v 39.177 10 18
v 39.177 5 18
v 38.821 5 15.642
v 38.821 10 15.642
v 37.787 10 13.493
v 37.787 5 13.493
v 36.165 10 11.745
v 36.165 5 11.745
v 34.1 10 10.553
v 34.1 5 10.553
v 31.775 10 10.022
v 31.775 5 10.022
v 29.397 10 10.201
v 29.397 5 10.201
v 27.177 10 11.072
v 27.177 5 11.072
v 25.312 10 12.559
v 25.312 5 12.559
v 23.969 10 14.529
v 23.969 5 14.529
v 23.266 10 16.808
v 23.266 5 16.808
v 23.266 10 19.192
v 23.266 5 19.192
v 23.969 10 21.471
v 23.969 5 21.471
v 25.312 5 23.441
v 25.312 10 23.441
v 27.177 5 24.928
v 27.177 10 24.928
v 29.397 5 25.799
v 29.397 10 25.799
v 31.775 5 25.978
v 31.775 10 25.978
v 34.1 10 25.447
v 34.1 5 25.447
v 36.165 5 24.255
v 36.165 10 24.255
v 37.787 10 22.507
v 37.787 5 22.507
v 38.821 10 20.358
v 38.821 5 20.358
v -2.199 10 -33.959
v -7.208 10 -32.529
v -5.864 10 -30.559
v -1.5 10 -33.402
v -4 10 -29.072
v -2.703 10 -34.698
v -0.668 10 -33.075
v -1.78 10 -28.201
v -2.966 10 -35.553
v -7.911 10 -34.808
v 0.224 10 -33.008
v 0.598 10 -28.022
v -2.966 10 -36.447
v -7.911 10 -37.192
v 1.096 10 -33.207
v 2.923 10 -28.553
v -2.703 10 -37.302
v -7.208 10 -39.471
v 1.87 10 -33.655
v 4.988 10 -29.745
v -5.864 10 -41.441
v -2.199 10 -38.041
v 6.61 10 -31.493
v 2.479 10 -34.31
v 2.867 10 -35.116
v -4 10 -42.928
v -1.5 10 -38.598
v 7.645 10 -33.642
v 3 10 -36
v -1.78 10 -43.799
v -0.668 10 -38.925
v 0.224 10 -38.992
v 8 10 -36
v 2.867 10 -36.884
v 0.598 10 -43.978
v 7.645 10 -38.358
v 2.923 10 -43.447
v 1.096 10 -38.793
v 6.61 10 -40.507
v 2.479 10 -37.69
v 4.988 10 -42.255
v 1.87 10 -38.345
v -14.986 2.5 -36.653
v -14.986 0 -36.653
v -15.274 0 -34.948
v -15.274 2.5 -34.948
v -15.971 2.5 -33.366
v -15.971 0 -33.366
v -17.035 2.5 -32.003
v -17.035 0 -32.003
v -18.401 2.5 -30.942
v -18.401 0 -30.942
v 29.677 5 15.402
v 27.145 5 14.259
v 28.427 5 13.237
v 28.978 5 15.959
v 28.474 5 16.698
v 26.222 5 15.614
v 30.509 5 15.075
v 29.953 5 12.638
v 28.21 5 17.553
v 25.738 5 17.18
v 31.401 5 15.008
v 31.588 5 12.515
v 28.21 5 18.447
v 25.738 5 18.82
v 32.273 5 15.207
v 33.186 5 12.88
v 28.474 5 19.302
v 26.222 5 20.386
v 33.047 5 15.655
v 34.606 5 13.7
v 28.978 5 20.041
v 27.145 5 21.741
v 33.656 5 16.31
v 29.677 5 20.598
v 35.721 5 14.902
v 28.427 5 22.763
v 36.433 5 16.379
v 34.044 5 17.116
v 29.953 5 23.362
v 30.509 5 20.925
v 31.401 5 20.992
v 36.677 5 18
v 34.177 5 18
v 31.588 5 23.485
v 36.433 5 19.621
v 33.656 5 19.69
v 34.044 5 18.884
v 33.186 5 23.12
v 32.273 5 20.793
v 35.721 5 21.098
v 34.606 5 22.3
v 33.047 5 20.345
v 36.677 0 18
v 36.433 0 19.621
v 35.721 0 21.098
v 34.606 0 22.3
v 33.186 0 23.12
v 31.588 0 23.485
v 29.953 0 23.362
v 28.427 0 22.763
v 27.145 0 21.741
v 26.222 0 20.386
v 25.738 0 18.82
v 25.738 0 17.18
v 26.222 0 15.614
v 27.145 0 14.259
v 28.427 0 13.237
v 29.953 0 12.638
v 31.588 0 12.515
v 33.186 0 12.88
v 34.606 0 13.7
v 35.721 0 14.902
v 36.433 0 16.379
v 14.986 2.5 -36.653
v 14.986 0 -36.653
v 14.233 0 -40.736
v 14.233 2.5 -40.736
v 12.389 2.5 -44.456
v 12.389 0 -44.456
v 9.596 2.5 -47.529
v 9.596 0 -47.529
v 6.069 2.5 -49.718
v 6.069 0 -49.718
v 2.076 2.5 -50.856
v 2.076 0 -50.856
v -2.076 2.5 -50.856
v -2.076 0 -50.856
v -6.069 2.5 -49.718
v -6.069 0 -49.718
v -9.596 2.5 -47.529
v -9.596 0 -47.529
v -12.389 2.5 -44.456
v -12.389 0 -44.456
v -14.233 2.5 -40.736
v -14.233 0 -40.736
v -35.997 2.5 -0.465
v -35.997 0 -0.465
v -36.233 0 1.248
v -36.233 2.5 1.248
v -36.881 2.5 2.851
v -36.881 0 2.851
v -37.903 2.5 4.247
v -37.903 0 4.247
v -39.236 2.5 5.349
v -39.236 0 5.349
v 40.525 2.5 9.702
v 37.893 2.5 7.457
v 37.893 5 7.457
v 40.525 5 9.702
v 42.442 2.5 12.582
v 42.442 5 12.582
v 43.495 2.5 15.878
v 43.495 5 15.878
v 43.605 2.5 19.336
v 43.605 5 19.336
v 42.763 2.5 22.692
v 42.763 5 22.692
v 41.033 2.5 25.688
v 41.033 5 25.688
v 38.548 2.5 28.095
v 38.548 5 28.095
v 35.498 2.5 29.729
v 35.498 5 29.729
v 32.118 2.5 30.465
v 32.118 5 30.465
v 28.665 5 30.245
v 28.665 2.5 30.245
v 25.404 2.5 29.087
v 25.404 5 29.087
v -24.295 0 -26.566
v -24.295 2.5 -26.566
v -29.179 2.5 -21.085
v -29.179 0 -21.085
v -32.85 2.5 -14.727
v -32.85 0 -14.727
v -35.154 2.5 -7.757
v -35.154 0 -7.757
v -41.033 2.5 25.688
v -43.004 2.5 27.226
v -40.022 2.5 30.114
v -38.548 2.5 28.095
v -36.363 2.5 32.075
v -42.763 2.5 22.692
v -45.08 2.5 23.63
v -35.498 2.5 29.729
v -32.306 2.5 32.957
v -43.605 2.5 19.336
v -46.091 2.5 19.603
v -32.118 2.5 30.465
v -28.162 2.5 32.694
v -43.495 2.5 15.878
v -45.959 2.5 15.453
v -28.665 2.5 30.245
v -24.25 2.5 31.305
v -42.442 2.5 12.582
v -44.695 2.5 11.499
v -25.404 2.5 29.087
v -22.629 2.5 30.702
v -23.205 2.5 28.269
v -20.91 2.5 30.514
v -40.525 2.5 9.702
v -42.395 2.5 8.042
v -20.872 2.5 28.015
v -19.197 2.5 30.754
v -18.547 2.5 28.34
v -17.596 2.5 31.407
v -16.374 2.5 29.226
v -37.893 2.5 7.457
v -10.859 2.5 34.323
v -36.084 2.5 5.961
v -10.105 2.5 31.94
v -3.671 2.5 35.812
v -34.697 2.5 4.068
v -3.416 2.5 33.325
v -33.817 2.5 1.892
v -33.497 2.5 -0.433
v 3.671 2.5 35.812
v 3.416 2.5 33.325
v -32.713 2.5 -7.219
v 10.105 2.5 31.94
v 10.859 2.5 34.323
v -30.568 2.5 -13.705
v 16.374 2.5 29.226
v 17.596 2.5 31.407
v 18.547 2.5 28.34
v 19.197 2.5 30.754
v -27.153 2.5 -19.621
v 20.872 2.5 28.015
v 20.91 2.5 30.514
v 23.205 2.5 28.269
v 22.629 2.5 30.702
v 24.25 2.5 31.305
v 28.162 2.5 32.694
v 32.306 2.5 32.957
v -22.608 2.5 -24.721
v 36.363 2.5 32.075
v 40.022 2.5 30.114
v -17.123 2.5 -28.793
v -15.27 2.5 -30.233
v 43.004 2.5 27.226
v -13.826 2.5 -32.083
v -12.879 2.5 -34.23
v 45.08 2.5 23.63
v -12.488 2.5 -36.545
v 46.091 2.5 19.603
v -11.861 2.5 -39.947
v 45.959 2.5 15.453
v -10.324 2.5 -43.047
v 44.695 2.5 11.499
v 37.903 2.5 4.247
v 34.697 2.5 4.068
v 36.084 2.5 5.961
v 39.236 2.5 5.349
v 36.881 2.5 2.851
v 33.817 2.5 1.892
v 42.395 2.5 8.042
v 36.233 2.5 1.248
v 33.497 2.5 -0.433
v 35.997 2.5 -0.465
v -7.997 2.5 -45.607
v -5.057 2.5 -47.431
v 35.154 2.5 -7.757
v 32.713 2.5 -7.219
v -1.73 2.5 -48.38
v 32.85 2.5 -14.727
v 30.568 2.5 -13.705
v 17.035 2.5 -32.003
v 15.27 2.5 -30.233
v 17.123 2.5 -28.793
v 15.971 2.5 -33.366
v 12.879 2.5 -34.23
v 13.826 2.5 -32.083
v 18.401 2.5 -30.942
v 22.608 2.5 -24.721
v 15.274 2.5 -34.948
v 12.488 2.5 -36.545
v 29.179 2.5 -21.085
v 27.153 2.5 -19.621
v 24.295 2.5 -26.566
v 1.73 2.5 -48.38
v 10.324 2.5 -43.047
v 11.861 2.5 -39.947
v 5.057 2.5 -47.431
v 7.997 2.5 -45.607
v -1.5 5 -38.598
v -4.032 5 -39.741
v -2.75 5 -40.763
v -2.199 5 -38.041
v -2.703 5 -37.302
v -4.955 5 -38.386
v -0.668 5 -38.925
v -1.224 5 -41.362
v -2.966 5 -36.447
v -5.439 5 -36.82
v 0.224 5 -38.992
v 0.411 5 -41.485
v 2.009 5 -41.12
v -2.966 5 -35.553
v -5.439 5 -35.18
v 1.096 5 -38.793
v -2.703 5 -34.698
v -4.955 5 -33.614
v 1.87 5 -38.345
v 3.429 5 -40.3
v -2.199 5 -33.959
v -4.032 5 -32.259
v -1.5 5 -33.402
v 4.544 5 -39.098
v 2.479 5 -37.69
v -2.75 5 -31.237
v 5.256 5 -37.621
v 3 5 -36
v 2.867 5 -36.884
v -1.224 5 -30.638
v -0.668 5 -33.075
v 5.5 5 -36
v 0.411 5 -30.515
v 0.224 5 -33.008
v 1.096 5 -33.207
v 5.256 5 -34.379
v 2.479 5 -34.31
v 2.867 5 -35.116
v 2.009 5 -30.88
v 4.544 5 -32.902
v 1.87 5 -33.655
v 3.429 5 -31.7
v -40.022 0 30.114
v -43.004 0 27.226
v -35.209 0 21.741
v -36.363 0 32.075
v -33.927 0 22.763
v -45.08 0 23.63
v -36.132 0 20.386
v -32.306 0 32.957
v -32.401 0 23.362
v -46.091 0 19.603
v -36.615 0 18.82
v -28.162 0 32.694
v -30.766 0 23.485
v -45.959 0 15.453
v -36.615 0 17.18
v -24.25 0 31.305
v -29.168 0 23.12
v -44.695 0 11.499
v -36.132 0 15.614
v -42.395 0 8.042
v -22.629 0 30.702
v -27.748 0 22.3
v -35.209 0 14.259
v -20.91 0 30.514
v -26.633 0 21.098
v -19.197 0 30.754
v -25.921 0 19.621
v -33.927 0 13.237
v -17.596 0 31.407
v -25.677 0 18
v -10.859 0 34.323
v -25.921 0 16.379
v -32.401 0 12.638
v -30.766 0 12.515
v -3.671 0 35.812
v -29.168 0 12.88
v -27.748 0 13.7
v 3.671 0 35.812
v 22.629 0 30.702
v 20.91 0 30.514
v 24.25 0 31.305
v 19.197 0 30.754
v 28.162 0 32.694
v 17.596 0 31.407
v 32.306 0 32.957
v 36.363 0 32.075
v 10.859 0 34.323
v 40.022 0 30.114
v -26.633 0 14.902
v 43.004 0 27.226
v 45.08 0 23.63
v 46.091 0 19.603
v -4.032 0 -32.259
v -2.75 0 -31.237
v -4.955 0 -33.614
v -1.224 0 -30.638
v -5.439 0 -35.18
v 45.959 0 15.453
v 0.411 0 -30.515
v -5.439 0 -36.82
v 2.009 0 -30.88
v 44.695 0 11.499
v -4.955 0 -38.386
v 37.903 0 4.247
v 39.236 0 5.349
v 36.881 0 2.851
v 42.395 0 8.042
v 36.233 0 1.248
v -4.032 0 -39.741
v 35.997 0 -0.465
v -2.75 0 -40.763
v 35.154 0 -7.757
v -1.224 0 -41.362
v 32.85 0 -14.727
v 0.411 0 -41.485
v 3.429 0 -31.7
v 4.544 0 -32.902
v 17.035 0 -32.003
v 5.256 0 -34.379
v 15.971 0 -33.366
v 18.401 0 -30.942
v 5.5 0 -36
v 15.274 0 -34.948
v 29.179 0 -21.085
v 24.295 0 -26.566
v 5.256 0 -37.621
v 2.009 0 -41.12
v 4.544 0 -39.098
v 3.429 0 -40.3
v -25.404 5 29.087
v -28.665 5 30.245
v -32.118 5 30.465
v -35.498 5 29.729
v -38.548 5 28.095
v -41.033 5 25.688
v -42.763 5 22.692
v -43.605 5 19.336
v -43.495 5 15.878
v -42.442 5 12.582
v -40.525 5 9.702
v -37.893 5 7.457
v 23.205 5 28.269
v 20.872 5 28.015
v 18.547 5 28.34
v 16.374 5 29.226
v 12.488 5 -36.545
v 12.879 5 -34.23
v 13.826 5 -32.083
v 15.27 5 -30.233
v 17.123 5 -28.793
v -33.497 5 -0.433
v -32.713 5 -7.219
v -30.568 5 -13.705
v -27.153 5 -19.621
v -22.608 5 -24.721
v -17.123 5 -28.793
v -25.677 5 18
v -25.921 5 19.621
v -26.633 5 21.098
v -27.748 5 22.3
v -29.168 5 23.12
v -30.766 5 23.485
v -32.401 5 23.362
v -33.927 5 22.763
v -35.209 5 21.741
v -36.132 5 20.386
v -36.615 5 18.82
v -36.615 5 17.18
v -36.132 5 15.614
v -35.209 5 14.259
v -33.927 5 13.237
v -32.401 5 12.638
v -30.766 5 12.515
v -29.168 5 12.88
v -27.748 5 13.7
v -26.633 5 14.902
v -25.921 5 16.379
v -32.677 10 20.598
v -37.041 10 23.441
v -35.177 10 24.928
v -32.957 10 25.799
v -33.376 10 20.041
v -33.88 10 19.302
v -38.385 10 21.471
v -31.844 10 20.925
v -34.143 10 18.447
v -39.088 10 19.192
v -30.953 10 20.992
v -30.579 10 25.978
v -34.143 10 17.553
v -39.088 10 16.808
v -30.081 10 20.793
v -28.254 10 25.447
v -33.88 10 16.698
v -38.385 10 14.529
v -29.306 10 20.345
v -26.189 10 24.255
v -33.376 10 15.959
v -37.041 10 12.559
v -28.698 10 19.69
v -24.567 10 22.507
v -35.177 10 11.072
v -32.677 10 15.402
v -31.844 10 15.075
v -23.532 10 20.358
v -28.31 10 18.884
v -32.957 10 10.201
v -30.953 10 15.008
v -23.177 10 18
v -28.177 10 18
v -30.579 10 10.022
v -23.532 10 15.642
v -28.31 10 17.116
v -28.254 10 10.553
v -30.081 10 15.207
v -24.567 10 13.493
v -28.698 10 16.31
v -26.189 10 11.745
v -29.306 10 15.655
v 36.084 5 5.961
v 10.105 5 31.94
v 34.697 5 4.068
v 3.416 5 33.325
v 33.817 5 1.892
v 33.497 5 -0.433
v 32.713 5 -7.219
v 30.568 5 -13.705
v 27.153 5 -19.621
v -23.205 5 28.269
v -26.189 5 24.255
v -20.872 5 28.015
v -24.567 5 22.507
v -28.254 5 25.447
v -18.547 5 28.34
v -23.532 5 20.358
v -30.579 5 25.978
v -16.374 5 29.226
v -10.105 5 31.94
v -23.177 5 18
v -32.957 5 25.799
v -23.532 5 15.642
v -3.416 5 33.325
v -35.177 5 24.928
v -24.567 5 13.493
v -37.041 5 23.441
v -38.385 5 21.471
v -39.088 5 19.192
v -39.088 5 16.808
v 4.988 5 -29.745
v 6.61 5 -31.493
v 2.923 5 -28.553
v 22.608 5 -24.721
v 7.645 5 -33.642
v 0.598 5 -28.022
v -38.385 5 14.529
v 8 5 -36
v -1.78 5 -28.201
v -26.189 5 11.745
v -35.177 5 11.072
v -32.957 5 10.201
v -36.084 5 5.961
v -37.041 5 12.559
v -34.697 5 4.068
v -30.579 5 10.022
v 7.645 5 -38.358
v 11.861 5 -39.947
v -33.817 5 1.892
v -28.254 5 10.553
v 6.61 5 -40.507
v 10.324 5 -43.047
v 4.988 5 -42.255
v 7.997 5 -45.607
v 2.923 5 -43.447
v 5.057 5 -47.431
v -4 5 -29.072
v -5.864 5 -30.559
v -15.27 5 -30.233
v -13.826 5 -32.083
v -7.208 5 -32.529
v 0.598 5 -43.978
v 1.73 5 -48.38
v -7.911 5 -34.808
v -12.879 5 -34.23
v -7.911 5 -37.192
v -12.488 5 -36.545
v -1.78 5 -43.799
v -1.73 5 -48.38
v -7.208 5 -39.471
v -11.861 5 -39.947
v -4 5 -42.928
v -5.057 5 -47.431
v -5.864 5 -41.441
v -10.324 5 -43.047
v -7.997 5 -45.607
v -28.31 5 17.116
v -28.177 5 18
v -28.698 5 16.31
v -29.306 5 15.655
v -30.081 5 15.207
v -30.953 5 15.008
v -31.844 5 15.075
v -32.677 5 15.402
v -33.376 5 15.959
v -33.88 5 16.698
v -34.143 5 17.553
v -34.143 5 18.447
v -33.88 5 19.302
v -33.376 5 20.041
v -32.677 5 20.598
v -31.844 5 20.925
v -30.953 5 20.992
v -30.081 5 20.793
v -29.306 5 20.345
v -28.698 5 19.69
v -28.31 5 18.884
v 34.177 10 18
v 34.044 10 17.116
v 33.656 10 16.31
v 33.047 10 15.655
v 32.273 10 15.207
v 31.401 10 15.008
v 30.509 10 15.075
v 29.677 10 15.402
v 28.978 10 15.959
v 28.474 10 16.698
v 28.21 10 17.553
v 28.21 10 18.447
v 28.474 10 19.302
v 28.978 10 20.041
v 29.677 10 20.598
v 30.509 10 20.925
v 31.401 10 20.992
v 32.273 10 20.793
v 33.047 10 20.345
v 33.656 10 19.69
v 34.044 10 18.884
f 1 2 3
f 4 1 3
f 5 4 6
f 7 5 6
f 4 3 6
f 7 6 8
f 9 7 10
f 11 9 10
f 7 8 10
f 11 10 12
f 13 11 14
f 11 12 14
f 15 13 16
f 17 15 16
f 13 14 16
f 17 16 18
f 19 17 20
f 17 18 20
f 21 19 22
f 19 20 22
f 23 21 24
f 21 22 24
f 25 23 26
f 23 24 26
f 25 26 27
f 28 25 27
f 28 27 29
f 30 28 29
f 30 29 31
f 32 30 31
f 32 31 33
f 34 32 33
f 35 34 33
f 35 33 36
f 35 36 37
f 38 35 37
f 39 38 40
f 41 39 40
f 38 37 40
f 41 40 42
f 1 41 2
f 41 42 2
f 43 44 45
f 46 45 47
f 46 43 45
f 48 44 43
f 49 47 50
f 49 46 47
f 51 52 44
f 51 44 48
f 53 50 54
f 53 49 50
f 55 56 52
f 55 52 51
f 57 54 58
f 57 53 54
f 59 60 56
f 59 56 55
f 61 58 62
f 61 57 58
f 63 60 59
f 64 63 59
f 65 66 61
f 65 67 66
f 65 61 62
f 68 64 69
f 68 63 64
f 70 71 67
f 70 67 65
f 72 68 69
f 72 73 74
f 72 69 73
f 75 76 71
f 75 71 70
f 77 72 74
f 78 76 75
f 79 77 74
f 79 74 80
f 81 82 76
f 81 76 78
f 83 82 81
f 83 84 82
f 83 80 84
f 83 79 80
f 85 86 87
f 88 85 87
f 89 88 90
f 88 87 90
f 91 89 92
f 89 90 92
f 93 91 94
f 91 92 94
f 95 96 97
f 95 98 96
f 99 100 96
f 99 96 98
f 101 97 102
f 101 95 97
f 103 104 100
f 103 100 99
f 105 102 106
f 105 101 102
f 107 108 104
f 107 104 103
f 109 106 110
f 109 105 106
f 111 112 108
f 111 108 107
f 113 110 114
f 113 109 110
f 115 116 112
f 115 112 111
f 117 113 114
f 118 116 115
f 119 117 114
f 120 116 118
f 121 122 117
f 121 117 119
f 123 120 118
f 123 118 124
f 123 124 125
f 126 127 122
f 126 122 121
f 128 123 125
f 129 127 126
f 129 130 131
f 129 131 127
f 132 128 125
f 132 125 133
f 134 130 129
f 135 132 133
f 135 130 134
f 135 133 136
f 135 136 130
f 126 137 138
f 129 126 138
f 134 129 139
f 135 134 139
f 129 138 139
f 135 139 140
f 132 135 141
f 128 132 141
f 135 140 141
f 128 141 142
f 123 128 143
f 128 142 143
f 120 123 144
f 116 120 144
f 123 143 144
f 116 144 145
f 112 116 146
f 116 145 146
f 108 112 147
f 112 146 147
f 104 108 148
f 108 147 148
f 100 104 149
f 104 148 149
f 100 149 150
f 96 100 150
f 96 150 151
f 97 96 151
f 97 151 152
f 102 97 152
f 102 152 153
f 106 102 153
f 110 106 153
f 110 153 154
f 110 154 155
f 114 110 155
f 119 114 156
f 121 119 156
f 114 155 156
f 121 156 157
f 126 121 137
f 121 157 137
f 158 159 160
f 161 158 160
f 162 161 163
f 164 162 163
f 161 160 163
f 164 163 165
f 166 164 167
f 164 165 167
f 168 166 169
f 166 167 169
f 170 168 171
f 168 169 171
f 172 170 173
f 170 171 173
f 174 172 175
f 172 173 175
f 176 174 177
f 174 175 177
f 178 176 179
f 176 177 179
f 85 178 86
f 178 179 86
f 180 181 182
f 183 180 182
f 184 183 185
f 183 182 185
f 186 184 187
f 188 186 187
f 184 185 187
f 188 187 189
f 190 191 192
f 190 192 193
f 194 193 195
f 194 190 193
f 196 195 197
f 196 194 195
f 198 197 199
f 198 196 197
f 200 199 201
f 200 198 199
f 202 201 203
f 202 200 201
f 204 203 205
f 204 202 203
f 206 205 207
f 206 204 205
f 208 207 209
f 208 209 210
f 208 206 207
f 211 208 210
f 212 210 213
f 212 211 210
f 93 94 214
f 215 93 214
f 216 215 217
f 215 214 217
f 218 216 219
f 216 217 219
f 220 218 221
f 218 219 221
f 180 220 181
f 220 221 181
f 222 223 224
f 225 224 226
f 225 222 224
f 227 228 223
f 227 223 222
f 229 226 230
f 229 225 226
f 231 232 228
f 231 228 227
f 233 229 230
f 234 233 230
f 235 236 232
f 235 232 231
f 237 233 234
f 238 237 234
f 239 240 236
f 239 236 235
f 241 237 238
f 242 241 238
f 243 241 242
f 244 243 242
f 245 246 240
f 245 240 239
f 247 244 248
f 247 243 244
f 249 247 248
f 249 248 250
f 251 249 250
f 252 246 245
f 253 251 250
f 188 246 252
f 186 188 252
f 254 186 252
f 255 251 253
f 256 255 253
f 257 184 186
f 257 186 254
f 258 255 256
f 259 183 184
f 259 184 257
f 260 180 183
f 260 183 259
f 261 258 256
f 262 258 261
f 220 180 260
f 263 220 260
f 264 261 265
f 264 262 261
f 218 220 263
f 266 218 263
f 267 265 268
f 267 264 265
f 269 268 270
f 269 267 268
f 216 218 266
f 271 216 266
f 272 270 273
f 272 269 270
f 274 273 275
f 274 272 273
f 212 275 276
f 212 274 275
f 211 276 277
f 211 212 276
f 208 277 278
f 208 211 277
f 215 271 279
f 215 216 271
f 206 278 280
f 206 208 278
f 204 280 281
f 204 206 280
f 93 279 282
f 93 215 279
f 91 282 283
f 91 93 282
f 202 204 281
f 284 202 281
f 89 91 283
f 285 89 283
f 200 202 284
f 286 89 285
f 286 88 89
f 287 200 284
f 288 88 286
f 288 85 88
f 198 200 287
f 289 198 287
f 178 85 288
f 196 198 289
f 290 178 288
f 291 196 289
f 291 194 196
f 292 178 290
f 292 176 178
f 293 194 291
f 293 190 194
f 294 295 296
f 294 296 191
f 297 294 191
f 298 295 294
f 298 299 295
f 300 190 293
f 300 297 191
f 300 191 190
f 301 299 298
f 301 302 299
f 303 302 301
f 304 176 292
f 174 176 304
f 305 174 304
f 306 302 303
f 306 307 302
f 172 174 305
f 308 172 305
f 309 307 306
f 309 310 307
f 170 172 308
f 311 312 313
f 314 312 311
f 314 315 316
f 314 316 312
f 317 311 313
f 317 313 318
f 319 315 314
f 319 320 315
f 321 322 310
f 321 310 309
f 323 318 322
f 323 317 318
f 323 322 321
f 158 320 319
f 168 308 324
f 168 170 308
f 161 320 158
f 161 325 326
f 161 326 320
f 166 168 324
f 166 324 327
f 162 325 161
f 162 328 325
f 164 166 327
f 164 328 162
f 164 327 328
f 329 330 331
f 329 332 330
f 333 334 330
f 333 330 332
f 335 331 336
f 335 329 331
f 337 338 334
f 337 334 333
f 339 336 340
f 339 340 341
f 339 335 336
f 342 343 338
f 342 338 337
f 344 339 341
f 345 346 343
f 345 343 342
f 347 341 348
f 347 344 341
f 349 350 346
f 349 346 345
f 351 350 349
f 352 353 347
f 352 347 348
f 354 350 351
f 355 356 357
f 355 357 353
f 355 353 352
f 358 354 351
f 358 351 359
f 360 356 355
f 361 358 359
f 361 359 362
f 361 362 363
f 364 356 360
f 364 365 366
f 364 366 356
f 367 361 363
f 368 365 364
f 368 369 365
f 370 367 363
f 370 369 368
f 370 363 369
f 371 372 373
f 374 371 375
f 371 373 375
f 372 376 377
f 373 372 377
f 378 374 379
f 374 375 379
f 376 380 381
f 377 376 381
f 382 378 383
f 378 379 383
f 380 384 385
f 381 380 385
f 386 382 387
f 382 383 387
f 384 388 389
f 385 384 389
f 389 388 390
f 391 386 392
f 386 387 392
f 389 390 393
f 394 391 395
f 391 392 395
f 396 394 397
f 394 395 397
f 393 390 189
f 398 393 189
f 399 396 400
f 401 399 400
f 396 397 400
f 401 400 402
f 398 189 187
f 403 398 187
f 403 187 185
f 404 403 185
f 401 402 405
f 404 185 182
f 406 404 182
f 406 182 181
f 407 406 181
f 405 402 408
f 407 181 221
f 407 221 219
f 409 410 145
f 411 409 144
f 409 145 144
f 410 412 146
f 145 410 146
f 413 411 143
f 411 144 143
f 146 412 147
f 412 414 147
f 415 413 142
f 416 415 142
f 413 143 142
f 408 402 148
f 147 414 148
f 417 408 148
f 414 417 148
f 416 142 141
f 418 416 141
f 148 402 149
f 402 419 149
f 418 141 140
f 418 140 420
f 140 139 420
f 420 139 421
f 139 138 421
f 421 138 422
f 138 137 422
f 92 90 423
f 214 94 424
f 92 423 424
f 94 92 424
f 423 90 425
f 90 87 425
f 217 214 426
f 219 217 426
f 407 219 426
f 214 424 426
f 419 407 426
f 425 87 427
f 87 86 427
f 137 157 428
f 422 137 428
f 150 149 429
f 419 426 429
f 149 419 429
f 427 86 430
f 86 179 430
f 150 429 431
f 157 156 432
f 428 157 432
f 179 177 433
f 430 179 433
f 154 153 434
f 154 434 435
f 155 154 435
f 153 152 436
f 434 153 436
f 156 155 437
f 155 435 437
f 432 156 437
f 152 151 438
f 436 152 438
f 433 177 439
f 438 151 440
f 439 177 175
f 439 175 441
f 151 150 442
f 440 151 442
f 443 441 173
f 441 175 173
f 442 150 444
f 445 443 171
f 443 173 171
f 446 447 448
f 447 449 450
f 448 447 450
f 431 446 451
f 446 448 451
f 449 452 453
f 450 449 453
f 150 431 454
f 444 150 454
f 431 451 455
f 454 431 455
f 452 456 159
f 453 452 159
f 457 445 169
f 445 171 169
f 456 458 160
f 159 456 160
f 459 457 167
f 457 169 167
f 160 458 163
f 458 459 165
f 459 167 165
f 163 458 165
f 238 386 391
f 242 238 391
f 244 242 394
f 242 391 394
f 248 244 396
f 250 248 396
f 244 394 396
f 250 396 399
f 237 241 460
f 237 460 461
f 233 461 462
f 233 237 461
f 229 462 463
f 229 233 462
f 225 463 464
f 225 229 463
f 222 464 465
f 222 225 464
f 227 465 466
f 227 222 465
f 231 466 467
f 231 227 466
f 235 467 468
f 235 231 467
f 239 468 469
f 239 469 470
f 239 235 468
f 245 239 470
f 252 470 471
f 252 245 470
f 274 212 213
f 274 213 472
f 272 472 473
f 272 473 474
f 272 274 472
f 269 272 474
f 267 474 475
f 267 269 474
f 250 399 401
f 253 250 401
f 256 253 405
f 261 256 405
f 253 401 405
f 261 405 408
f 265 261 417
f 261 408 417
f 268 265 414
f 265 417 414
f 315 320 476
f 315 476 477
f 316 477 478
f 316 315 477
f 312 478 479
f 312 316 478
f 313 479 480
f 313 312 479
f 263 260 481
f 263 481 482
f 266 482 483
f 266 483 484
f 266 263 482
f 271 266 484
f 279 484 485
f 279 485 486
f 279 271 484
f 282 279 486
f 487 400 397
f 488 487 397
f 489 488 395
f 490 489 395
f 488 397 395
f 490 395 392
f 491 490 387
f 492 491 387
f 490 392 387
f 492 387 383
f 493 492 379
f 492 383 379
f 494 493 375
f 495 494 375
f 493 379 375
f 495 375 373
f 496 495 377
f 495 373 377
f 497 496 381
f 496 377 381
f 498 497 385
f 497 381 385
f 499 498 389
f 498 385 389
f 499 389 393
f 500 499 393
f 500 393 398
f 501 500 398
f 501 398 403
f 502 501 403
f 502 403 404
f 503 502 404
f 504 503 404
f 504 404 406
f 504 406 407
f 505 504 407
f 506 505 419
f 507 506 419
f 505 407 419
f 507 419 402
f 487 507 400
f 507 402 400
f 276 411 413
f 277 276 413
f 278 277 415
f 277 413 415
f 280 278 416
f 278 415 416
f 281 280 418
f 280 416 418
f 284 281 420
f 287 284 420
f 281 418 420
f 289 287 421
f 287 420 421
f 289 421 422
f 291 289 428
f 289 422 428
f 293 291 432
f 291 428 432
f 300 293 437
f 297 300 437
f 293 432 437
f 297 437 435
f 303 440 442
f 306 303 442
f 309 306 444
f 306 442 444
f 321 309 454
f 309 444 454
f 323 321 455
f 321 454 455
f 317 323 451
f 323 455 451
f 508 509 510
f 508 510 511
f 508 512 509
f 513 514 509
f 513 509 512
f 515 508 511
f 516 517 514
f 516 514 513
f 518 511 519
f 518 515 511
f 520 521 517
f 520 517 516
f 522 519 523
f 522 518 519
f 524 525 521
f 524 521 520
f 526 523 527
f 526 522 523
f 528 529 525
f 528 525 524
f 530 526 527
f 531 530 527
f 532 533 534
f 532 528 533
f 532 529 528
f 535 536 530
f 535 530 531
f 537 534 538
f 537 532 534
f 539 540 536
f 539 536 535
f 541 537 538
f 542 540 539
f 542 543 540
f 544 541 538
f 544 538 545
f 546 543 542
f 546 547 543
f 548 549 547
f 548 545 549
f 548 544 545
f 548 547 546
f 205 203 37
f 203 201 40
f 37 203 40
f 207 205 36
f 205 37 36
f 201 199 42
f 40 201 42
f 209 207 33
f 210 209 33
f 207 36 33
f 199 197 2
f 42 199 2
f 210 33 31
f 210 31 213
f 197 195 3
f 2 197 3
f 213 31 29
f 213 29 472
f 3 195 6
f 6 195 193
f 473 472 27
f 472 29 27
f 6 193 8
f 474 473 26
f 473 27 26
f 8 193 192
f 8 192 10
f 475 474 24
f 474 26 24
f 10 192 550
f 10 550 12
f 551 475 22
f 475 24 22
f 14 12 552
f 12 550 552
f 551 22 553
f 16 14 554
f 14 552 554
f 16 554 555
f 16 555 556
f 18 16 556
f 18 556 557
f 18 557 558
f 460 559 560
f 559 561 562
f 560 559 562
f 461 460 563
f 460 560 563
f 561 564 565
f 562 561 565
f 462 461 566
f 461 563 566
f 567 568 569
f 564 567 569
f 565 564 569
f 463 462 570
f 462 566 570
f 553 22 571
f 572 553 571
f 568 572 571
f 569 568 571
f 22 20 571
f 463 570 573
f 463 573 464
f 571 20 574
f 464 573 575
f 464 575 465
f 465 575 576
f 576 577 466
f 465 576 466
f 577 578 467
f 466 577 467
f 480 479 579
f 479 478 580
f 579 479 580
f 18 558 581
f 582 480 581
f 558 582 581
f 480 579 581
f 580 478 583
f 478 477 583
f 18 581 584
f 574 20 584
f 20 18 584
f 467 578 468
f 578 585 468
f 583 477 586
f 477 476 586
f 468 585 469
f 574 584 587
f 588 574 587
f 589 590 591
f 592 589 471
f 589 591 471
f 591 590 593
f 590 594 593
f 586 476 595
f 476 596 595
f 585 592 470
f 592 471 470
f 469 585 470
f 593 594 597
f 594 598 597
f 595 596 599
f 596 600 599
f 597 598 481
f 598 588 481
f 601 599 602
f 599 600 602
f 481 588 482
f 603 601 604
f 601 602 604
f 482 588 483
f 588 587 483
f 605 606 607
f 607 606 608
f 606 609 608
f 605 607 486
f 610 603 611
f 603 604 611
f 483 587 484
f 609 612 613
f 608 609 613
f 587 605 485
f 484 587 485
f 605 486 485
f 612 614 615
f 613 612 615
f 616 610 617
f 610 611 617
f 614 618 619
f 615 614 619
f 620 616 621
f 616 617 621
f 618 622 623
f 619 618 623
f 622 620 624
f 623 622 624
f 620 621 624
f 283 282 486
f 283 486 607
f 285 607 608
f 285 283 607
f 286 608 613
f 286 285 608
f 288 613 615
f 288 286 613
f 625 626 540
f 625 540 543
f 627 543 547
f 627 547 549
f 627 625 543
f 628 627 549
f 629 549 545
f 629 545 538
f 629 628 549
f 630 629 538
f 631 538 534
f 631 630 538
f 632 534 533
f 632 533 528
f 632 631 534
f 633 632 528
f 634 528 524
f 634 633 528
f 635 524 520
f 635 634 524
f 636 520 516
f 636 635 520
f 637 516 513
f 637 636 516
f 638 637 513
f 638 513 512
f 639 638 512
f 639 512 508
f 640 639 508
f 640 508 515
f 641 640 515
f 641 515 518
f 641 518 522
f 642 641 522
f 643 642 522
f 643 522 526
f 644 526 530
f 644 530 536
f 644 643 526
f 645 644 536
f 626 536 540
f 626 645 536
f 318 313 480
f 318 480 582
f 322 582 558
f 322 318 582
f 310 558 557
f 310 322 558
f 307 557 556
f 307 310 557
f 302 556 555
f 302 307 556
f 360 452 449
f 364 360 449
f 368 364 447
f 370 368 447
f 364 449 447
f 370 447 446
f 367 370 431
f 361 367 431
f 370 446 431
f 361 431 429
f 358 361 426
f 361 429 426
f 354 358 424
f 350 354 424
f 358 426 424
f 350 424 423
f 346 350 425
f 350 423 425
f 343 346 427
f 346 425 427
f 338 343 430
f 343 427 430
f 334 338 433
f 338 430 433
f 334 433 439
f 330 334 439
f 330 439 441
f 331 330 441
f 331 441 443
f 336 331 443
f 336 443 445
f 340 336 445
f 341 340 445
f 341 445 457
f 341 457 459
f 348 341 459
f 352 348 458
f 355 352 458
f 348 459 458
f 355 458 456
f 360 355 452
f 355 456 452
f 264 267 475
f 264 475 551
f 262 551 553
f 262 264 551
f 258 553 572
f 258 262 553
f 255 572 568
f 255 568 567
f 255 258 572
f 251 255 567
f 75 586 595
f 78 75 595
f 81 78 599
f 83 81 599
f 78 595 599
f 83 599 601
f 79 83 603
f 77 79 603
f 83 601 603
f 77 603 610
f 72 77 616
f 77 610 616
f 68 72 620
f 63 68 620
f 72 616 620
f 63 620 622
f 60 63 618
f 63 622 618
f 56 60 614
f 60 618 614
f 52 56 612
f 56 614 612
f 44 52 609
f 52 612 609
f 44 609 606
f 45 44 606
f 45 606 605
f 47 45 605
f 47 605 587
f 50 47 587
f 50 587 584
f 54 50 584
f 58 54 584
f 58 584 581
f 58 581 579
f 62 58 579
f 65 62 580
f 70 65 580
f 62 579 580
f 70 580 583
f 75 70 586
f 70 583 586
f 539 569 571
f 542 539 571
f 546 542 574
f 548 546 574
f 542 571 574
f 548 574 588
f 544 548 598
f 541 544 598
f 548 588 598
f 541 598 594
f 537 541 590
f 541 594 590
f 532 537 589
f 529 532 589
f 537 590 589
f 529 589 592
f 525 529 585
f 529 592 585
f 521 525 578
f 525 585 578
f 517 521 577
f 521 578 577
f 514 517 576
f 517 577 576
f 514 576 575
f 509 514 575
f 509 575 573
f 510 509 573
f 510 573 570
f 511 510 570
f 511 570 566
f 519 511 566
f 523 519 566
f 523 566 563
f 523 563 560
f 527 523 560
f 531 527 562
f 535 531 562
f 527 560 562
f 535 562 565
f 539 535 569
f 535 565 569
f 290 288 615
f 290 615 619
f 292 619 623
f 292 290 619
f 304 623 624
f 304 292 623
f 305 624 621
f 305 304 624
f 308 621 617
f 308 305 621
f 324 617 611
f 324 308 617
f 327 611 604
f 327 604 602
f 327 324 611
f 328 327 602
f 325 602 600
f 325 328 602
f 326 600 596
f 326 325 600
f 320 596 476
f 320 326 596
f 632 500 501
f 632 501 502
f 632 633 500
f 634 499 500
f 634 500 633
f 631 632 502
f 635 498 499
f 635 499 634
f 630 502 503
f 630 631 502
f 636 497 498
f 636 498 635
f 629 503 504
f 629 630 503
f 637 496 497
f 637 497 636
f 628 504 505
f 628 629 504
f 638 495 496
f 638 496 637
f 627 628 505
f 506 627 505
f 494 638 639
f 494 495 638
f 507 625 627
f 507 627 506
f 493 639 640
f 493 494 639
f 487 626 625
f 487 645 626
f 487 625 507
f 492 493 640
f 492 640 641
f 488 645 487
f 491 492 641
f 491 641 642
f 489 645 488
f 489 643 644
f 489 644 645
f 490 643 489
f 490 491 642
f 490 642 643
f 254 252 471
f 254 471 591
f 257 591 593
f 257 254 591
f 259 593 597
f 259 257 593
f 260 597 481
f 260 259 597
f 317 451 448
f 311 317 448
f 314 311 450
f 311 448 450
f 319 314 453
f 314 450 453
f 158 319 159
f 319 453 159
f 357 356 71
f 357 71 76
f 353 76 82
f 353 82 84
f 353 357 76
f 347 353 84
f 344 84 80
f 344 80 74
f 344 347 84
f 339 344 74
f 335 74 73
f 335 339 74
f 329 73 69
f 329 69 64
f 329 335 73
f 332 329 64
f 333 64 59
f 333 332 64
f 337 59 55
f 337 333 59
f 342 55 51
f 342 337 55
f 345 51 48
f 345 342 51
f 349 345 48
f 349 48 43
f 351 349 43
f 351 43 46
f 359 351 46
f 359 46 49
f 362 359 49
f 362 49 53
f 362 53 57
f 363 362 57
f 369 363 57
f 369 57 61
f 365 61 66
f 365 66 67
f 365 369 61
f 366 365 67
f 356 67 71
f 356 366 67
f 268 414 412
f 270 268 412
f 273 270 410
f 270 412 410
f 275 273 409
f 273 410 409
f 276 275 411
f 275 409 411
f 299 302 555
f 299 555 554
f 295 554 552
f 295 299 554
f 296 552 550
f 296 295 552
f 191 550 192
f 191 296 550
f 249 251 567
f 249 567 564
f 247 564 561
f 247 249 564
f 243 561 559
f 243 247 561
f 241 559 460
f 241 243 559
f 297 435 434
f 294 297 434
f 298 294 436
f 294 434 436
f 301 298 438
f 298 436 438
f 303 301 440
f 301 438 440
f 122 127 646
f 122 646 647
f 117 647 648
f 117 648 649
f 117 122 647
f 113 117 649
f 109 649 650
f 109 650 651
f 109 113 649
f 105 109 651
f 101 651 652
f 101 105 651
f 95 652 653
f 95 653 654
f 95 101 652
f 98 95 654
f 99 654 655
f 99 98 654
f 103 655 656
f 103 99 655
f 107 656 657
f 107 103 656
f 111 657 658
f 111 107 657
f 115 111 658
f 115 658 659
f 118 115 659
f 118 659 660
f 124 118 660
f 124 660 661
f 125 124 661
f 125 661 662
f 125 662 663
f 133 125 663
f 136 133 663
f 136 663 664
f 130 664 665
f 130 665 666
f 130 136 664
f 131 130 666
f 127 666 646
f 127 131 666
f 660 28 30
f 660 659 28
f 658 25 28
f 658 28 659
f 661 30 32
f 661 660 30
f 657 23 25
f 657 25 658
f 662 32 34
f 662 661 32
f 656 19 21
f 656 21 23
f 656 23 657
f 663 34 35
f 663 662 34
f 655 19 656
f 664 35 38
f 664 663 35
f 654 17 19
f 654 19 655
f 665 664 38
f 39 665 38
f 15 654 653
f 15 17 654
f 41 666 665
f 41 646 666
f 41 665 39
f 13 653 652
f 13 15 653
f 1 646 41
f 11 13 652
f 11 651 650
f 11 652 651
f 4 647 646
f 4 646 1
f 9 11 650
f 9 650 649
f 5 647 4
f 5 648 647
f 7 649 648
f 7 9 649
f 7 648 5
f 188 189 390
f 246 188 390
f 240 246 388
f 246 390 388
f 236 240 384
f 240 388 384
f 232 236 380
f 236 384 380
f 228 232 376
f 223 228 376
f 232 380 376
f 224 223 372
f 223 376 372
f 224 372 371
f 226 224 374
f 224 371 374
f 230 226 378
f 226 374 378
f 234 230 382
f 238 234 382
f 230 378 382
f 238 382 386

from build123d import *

# Parameters (mm, degrees)
BOSS_EXTRUDE1_DEPTH = 2.5
BOSS_EXTRUDE2_DEPTH = 2.5
SKETCH3_R           = 8
SKETCH3_R_2         = 3
BOSS_EXTRUDE3_DEPTH = 5
SKETCH4_R           = 5.5
CUT_EXTRUDE1_DEPTH  = 5


with BuildPart() as part:
    # Sketch1 → Boss-Extrude1 (new body)
    with BuildSketch(Plane(origin=(0, 0, 0), x_dir=(1, 0, 0), z_dir=(0, 1, 0))):
        with BuildLine():
            ThreePointArc((-18.401121459, 30.941860465), (-31.176914536, 18), (-35.996997933, 0.464908409))
            ThreePointArc((-35.996997933, 0.464908409), (-36.88129594, -2.851352197), (-39.235664305, -5.348654136))
            ThreePointArc((-39.235664305, -5.348654136), (-44.167295593, -25.5), (-24.249902511, -31.304754955))
            ThreePointArc((-24.249902511, -31.304754955), (-20.909991408, -30.51446311), (-17.595876474, -31.406768874))
            ThreePointArc((-17.595876474, -31.406768874), (0, -36), (17.595876474, -31.406768874))
            ThreePointArc((17.595876474, -31.406768874), (20.909991408, -30.51446311), (24.249902511, -31.304754955))
            ThreePointArc((24.249902511, -31.304754955), (44.167295593, -25.5), (39.235664305, -5.348654136))
            ThreePointArc((39.235664305, -5.348654136), (36.88129594, -2.851352197), (35.996997933, 0.464908409))
            ThreePointArc((35.996997933, 0.464908409), (31.176914536, 18), (18.401121459, 30.941860465))
            ThreePointArc((18.401121459, 30.941860465), (15.971304532, 33.365815307), (14.985761794, 36.653409091))
            ThreePointArc((14.985761794, 36.653409091), (0, 51), (-14.985761794, 36.653409091))
            ThreePointArc((-14.985761794, 36.653409091), (-15.971304532, 33.365815307), (-18.401121459, 30.941860465))
        make_face()
    extrude(amount=BOSS_EXTRUDE1_DEPTH)

    # Sketch2 → Boss-Extrude2 (add)
    with BuildSketch(Plane(origin=(0, 2.5, 0), x_dir=(1, 0, 0), z_dir=(0, 1, 0))):
        with BuildLine():
            ThreePointArc((33.49720641, 0.432623103), (34.697325134, -4.068016291), (37.892539344, -7.45721178))
            ThreePointArc((37.892539344, -7.45721178), (42.002232084, -24.25), (25.404404515, -29.087295795))
            ThreePointArc((25.404404515, -29.087295795), (20.871668018, -28.014756864), (16.373940607, -29.225743258))
            ThreePointArc((16.373940607, -29.225743258), (0, -33.5), (-16.373940607, -29.225743258))
            ThreePointArc((-16.373940607, -29.225743258), (-20.871668018, -28.014756864), (-25.404404515, -29.087295795))
            ThreePointArc((-25.404404515, -29.087295795), (-42.002232084, -24.25), (-37.892539344, -7.45721178))
            ThreePointArc((-37.892539344, -7.45721178), (-34.697325134, -4.068016291), (-33.49720641, 0.432623103))
            ThreePointArc((-33.49720641, 0.432623103), (-29.011851027, 16.75), (-17.123265802, 28.793120155))
            ThreePointArc((-17.123265802, 28.793120155), (-13.825657116, 32.082773155), (-12.488134829, 36.544507576))
            ThreePointArc((-12.488134829, 36.544507576), (0, 48.5), (12.488134829, 36.544507576))
            ThreePointArc((12.488134829, 36.544507576), (13.825657116, 32.082773155), (17.123265802, 28.793120155))
            ThreePointArc((17.123265802, 28.793120155), (29.011851027, 16.75), (33.49720641, 0.432623103))
        make_face()
    extrude(amount=BOSS_EXTRUDE2_DEPTH)

    # Sketch3 → Boss-Extrude3 (add)
    with BuildSketch(Plane(origin=(0, 5, 0), x_dir=(1, 0, 0), z_dir=(0, 1, 0))):
        with Locations((0, 36)):
            Circle(SKETCH3_R)
        with Locations((0, 36)):
            Circle(SKETCH3_R_2, mode=Mode.SUBTRACT)
        with Locations((31.176914536, -18)):
            Circle(SKETCH3_R)
        with Locations((31.176914536, -18)):
            Circle(SKETCH3_R_2, mode=Mode.SUBTRACT)
        with Locations((-31.176914536, -18)):
            Circle(SKETCH3_R)
        with Locations((-31.176914536, -18)):
            Circle(SKETCH3_R_2, mode=Mode.SUBTRACT)
    extrude(amount=BOSS_EXTRUDE3_DEPTH)

    # Sketch4 → Cut-Extrude1 (cut)
    with BuildSketch(Plane.XZ):
        with Locations((31.176914536, 18)):
            Circle(SKETCH4_R)
        with Locations((0, -36)):
            Circle(SKETCH4_R)
        with Locations((-31.176914536, 18)):
            Circle(SKETCH4_R)
    extrude(amount=-CUT_EXTRUDE1_DEPTH, mode=Mode.SUBTRACT)


solid = part.part
